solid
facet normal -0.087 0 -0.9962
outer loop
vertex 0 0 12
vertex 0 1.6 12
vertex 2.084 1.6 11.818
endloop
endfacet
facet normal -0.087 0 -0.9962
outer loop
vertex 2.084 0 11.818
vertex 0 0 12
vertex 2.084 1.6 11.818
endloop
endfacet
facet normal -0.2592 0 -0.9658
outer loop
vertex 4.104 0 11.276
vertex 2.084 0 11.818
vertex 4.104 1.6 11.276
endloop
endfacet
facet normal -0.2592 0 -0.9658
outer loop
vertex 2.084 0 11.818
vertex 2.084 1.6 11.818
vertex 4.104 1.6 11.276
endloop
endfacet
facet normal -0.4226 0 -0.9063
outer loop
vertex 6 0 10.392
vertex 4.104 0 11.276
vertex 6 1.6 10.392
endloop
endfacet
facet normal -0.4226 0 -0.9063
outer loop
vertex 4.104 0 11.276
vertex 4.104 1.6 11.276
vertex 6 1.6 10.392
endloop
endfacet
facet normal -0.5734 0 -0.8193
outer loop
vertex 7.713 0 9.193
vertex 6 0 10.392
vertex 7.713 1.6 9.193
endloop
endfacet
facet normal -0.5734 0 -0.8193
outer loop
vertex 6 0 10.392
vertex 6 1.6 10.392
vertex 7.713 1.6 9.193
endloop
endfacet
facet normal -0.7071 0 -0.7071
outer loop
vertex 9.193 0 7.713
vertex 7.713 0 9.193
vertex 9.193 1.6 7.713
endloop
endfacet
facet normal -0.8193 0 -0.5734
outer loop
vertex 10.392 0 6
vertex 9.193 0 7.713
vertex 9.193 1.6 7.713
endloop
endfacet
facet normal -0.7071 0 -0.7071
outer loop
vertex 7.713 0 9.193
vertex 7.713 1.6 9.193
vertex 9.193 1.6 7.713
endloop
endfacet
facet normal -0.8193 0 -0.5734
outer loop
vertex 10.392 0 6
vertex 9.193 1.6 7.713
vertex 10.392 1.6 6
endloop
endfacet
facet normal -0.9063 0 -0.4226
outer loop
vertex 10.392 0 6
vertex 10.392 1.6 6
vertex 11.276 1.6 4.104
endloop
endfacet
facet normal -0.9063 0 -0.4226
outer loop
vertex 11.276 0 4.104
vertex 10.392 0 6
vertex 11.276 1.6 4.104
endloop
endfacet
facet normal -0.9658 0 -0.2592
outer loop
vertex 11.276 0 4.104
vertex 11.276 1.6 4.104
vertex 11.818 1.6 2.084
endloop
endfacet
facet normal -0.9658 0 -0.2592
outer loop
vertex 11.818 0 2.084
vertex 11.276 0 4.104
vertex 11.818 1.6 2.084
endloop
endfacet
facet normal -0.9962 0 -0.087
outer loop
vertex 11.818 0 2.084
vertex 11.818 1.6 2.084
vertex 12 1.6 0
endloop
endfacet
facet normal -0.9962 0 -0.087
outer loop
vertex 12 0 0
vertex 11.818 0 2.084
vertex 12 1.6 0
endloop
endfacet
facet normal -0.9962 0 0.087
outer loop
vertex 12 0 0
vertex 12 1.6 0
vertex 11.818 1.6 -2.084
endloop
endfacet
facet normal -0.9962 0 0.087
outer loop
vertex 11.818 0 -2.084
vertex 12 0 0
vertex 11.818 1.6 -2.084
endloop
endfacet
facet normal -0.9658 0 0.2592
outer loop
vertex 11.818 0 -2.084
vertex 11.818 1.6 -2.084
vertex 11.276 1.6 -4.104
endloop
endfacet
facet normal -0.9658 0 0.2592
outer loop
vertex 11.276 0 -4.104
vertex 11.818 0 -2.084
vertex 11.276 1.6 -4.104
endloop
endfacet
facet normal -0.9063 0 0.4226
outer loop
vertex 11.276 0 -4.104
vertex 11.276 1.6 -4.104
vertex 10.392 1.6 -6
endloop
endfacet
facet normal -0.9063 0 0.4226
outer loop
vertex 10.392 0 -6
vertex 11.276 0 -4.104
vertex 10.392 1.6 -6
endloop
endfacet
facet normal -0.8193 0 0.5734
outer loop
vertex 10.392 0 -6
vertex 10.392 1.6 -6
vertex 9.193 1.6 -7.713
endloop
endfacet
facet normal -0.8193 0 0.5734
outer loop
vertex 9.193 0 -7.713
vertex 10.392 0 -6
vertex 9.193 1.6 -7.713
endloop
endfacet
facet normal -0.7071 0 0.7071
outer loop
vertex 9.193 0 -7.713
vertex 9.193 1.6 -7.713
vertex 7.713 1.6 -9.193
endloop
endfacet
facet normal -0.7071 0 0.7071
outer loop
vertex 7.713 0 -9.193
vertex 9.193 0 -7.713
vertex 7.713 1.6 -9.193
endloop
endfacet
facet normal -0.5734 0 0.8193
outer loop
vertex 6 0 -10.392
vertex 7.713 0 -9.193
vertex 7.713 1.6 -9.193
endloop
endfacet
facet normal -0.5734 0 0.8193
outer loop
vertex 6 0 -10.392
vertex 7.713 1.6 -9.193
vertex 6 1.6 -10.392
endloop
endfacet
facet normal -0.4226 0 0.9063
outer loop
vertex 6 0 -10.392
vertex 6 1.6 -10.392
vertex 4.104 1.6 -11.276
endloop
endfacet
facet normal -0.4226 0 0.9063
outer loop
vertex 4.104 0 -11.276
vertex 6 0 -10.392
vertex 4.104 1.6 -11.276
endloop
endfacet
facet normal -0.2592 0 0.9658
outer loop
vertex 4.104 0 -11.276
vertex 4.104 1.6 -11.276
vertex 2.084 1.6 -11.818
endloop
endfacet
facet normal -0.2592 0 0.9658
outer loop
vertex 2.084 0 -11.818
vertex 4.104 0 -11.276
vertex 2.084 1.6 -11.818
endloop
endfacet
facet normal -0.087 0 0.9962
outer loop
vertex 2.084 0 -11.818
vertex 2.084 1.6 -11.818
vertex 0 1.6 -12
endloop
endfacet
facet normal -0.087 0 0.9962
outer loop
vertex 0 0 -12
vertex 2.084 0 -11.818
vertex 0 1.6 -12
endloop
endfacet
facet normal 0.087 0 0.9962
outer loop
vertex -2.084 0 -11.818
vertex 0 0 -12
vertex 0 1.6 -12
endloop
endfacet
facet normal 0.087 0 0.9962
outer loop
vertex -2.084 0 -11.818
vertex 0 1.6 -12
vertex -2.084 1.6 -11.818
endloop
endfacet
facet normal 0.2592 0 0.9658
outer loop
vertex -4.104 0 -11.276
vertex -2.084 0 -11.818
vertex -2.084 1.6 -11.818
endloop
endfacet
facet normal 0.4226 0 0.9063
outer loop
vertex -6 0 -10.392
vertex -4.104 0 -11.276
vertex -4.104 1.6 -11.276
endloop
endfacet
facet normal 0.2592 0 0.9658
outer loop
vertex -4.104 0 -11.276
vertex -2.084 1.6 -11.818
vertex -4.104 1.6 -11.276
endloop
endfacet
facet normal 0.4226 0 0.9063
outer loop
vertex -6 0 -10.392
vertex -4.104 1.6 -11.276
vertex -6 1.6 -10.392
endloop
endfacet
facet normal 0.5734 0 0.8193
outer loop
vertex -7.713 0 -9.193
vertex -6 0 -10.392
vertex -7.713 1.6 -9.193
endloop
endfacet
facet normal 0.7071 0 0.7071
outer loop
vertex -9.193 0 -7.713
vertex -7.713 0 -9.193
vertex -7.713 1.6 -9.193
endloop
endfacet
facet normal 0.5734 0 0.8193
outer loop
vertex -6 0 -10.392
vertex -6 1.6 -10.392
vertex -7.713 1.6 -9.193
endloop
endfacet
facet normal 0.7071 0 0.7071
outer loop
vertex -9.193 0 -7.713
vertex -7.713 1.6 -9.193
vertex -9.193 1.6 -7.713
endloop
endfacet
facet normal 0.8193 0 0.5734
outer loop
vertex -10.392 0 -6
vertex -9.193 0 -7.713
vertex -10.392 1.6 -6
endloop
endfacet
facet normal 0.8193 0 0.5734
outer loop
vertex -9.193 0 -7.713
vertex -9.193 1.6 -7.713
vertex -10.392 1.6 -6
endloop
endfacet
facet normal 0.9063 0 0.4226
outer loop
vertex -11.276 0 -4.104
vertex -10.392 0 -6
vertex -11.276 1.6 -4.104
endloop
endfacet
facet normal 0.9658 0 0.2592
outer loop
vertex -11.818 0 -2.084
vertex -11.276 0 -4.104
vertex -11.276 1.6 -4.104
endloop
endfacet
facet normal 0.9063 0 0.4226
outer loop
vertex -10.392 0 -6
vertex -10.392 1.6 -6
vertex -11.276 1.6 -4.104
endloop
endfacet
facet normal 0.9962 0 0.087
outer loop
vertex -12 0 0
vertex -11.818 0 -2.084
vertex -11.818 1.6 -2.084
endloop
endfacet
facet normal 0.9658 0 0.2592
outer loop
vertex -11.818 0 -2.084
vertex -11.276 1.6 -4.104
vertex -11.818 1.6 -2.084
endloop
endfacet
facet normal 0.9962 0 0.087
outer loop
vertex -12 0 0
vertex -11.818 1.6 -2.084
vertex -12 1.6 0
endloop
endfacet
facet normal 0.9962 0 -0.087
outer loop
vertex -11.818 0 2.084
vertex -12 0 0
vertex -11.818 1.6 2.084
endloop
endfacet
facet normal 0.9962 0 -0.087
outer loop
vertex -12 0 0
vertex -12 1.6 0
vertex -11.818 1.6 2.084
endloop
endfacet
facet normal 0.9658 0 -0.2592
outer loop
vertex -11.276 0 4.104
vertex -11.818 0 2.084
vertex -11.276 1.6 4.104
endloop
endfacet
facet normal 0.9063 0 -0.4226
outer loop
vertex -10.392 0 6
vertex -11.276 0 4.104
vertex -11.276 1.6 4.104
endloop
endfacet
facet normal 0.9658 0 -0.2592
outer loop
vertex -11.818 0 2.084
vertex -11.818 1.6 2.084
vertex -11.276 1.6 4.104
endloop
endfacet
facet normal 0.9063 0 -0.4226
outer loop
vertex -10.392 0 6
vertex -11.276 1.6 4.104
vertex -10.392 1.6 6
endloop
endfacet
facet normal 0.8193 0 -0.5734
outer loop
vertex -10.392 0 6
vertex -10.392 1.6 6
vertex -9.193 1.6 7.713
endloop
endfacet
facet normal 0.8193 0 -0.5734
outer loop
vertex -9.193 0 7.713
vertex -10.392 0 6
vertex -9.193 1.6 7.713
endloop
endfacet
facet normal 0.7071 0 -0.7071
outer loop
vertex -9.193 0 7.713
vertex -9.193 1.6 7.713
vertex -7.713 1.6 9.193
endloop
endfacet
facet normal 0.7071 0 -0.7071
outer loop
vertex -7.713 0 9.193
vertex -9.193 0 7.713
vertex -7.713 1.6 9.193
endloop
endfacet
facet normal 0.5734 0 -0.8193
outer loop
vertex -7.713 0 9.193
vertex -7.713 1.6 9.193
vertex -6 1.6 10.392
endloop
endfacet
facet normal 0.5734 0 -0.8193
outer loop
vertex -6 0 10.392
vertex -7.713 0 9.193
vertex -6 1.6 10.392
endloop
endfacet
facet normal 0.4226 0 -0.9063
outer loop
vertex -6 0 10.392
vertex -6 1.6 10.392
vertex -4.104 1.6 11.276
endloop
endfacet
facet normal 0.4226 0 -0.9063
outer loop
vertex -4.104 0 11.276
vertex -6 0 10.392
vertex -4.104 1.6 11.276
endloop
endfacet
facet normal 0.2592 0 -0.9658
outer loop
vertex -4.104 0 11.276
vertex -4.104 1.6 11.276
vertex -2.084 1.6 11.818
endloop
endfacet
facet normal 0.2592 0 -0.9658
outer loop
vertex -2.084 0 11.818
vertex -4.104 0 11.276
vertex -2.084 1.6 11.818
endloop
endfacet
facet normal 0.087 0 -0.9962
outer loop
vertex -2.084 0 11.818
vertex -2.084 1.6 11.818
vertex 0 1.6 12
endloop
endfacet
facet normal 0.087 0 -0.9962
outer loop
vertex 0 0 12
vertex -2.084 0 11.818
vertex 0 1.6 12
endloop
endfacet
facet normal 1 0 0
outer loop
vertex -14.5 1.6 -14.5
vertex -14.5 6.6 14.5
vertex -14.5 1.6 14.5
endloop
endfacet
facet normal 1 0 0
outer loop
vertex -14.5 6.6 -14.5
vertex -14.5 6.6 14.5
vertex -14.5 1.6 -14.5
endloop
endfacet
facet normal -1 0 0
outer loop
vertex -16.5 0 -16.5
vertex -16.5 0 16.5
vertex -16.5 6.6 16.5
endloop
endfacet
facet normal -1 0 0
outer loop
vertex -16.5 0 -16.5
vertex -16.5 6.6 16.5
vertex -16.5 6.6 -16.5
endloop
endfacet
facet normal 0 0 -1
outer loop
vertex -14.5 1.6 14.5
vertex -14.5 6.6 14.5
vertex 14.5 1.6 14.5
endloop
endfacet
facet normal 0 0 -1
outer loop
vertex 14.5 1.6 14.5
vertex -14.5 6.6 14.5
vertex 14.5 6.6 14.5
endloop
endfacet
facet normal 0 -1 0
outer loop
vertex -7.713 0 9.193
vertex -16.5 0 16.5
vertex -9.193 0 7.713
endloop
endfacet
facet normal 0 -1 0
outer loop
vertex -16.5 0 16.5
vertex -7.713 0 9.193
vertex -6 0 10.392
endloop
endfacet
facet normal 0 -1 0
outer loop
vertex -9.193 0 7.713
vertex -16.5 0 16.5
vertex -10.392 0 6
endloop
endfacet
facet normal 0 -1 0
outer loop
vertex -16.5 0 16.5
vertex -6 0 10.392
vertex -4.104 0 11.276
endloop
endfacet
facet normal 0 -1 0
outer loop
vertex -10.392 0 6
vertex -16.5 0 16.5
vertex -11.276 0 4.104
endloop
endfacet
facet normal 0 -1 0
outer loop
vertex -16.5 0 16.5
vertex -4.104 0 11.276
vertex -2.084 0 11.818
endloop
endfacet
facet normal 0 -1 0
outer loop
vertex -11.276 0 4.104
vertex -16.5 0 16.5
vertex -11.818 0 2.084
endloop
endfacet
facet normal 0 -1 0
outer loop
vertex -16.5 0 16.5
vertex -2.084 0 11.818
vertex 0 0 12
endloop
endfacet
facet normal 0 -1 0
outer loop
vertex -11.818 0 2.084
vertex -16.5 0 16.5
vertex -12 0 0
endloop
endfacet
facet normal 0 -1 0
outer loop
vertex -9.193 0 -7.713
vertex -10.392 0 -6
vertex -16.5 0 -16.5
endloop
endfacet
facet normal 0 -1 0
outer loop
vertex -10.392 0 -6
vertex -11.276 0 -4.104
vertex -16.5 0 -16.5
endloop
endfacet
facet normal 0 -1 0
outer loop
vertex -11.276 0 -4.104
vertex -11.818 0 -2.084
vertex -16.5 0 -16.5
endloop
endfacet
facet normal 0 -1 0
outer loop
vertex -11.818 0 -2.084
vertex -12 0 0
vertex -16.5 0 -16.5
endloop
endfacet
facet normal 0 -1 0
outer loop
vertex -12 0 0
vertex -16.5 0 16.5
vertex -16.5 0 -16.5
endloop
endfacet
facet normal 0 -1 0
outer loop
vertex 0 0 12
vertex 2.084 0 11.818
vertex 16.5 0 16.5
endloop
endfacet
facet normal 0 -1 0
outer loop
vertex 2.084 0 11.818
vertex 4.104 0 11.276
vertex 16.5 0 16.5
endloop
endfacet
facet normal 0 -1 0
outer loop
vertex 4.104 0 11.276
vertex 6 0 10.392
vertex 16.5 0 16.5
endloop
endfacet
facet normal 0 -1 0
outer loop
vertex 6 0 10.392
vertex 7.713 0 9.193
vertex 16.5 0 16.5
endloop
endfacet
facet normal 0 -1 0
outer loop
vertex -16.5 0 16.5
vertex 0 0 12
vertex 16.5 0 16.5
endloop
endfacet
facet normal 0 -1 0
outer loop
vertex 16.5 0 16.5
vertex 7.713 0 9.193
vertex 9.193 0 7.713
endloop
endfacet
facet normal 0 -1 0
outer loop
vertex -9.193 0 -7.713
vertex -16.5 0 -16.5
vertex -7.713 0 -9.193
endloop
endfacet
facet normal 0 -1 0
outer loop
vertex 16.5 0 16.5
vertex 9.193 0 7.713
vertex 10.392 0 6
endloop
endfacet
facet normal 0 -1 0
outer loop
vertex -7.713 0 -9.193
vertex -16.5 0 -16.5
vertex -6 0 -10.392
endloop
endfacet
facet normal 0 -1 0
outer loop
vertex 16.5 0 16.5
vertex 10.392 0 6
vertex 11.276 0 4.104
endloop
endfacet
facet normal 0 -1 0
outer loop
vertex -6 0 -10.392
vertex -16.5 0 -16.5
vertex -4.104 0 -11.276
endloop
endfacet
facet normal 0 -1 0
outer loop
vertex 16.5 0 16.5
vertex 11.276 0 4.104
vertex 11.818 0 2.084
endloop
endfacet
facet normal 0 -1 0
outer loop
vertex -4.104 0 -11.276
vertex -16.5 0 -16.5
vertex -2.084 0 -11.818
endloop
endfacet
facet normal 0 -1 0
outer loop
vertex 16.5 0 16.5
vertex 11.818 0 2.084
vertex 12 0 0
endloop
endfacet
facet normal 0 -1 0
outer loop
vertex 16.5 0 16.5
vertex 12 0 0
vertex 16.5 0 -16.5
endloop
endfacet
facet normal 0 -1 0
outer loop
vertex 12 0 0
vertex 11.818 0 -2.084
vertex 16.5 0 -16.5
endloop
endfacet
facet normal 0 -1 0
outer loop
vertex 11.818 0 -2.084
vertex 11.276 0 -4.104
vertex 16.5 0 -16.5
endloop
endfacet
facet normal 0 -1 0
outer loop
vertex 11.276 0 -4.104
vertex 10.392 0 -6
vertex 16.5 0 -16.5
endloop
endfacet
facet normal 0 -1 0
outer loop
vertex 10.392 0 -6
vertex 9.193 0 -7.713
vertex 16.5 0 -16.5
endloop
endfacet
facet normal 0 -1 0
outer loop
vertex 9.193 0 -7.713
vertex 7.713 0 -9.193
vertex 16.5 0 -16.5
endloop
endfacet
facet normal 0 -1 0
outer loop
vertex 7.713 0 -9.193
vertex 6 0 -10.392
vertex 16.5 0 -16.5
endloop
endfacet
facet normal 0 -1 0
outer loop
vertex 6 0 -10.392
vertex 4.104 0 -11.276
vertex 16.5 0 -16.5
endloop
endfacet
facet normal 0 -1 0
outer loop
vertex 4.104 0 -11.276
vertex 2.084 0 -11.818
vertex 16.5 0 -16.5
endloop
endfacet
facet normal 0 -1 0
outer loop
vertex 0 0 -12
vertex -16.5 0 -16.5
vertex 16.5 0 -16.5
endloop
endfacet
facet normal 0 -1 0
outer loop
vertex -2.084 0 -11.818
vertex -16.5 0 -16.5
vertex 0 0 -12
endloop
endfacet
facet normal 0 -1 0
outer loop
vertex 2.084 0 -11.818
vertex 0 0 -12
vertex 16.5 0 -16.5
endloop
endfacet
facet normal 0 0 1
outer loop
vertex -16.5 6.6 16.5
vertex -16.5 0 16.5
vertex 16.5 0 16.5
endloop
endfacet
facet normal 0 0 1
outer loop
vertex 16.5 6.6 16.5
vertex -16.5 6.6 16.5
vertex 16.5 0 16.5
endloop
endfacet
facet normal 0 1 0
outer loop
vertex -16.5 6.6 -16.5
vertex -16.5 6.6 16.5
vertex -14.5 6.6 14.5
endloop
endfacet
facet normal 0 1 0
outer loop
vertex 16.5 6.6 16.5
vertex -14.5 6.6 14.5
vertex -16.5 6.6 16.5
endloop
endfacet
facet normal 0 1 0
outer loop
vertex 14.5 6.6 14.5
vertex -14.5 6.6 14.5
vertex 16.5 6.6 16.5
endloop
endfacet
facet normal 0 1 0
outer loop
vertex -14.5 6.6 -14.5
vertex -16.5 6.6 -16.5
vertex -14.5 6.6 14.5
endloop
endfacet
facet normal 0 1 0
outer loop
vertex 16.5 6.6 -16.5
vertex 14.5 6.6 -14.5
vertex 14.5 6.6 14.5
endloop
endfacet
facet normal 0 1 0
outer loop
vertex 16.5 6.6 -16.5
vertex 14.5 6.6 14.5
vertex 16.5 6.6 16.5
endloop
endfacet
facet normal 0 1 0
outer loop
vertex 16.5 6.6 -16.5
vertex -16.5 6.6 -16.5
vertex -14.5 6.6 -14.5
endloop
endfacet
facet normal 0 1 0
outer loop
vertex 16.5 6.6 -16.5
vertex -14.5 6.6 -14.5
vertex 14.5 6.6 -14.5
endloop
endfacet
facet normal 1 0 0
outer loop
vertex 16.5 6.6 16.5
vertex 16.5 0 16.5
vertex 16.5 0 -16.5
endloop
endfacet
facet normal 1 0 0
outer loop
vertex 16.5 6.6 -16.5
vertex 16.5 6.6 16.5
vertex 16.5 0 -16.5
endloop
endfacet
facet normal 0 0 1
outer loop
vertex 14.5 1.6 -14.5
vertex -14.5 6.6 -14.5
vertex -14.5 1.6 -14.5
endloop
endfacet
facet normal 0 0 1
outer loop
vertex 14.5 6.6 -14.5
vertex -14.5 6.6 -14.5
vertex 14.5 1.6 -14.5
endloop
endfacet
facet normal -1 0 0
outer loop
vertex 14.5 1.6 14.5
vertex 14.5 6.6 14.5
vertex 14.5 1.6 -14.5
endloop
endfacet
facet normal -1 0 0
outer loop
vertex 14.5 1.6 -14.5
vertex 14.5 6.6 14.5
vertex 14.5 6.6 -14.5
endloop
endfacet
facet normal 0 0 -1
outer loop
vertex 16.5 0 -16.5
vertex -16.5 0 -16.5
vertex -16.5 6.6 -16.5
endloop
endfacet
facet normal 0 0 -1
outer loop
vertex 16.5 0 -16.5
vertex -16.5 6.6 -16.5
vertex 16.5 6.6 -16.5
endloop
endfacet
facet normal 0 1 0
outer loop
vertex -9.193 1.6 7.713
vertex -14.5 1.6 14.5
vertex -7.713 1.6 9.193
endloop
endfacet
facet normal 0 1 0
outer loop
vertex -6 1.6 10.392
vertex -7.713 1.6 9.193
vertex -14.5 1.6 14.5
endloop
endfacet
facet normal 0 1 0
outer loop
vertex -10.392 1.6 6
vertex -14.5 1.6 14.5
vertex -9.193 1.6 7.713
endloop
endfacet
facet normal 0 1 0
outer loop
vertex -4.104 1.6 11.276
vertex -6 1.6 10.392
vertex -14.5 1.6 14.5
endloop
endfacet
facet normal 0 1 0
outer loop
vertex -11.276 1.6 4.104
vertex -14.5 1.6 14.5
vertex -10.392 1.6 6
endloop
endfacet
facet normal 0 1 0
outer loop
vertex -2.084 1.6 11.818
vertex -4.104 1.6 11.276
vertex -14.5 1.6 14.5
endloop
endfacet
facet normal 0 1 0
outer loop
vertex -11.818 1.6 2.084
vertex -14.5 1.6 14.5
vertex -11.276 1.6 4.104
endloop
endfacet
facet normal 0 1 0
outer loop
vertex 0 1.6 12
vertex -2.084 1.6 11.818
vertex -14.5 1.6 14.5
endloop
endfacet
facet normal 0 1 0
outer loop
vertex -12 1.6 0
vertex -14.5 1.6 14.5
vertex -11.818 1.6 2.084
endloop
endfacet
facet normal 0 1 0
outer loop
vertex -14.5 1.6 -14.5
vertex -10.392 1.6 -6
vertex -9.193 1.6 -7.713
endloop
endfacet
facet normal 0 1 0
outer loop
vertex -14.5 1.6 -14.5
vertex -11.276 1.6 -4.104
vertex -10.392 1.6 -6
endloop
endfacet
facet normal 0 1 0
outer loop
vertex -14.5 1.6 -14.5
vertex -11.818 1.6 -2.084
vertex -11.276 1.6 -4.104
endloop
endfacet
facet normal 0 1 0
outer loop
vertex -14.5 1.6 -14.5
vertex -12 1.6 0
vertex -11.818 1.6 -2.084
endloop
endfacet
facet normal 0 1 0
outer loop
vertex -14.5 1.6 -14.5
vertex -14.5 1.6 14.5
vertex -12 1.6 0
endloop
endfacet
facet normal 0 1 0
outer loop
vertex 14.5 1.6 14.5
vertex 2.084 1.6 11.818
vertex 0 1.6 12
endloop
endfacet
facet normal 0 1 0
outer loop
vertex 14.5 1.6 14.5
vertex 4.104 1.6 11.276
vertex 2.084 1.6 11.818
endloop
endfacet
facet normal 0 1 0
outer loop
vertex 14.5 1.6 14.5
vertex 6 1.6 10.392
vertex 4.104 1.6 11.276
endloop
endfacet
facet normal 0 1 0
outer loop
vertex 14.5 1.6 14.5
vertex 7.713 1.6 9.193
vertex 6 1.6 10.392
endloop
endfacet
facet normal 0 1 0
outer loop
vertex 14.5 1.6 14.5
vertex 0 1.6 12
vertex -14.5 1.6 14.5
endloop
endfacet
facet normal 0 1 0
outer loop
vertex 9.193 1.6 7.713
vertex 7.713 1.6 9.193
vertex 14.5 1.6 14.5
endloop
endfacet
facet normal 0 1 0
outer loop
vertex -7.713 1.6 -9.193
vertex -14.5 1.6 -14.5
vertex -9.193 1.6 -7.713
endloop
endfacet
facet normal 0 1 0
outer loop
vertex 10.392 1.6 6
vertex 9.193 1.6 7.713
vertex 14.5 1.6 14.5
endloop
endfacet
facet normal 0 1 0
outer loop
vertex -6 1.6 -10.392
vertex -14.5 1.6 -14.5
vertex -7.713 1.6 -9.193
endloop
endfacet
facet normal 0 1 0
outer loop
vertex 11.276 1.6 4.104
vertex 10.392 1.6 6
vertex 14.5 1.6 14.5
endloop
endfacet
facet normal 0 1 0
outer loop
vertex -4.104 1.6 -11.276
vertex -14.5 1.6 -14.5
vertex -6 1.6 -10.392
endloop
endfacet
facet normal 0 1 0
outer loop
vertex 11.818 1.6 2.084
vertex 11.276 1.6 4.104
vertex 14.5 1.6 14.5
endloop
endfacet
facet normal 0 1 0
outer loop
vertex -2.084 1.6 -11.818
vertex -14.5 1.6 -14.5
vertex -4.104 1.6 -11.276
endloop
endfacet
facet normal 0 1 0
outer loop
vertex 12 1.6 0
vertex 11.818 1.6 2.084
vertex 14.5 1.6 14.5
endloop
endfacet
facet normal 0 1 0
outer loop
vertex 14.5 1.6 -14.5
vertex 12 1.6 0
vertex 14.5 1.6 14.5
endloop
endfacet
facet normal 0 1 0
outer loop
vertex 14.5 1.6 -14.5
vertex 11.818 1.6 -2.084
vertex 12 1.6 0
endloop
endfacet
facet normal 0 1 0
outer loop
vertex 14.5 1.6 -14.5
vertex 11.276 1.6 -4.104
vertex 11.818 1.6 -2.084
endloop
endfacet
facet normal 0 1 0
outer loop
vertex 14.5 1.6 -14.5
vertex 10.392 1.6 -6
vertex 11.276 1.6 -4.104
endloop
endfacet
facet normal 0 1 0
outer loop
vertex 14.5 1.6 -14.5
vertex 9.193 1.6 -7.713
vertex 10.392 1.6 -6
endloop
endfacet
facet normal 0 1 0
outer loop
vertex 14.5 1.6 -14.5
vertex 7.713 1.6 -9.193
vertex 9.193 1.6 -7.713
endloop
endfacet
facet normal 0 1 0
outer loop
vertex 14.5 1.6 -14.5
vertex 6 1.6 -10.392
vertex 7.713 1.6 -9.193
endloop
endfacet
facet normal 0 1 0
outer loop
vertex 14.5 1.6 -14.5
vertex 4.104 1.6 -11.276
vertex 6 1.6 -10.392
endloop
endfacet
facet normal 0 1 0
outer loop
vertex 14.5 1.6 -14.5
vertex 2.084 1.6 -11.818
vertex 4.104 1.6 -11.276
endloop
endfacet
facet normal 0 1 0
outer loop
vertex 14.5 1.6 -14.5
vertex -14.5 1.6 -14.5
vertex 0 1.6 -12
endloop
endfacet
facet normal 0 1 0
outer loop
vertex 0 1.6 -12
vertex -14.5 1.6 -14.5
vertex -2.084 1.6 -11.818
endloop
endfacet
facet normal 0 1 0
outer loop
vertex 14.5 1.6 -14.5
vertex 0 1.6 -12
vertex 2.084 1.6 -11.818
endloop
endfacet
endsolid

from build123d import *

# Parameters (mm, degrees)
CROQUIS1_W              = 33
CROQUIS1_H              = 33
SALIENTE_EXTRUIR1_DEPTH = 6.6
CROQUIS2_W              = 29
CROQUIS2_H              = 29
CORTAR_EXTRUIR1_DEPTH   = 5
CROQUIS3_R              = 12
CORTAR_EXTRUIR2_DEPTH   = 5


with BuildPart() as part:
    # Croquis1 → Saliente-Extruir1 (new body)
    with BuildSketch(Plane(origin=(0, 0, 0), x_dir=(1, 0, 0), z_dir=(0, 1, 0))):
        Rectangle(CROQUIS1_W, CROQUIS1_H)
    extrude(amount=SALIENTE_EXTRUIR1_DEPTH)

    # Croquis2 → Cortar-Extruir1 (cut)
    with BuildSketch(Plane(origin=(0, 6.6, 0), x_dir=(1, 0, 0), z_dir=(0, 1, 0))):
        Rectangle(CROQUIS2_W, CROQUIS2_H)
    extrude(amount=-CORTAR_EXTRUIR1_DEPTH, mode=Mode.SUBTRACT)

    # Croquis3 → Cortar-Extruir2 (cut)
    with BuildSketch(Plane(origin=(0, 1.6, 0), x_dir=(1, 0, 0), z_dir=(0, 1, 0))):
        with Locations(Location((0, 0, 0), (0, 0, 270))):
            Circle(CROQUIS3_R)
    extrude(amount=-CORTAR_EXTRUIR2_DEPTH, mode=Mode.SUBTRACT)


solid = part.part
